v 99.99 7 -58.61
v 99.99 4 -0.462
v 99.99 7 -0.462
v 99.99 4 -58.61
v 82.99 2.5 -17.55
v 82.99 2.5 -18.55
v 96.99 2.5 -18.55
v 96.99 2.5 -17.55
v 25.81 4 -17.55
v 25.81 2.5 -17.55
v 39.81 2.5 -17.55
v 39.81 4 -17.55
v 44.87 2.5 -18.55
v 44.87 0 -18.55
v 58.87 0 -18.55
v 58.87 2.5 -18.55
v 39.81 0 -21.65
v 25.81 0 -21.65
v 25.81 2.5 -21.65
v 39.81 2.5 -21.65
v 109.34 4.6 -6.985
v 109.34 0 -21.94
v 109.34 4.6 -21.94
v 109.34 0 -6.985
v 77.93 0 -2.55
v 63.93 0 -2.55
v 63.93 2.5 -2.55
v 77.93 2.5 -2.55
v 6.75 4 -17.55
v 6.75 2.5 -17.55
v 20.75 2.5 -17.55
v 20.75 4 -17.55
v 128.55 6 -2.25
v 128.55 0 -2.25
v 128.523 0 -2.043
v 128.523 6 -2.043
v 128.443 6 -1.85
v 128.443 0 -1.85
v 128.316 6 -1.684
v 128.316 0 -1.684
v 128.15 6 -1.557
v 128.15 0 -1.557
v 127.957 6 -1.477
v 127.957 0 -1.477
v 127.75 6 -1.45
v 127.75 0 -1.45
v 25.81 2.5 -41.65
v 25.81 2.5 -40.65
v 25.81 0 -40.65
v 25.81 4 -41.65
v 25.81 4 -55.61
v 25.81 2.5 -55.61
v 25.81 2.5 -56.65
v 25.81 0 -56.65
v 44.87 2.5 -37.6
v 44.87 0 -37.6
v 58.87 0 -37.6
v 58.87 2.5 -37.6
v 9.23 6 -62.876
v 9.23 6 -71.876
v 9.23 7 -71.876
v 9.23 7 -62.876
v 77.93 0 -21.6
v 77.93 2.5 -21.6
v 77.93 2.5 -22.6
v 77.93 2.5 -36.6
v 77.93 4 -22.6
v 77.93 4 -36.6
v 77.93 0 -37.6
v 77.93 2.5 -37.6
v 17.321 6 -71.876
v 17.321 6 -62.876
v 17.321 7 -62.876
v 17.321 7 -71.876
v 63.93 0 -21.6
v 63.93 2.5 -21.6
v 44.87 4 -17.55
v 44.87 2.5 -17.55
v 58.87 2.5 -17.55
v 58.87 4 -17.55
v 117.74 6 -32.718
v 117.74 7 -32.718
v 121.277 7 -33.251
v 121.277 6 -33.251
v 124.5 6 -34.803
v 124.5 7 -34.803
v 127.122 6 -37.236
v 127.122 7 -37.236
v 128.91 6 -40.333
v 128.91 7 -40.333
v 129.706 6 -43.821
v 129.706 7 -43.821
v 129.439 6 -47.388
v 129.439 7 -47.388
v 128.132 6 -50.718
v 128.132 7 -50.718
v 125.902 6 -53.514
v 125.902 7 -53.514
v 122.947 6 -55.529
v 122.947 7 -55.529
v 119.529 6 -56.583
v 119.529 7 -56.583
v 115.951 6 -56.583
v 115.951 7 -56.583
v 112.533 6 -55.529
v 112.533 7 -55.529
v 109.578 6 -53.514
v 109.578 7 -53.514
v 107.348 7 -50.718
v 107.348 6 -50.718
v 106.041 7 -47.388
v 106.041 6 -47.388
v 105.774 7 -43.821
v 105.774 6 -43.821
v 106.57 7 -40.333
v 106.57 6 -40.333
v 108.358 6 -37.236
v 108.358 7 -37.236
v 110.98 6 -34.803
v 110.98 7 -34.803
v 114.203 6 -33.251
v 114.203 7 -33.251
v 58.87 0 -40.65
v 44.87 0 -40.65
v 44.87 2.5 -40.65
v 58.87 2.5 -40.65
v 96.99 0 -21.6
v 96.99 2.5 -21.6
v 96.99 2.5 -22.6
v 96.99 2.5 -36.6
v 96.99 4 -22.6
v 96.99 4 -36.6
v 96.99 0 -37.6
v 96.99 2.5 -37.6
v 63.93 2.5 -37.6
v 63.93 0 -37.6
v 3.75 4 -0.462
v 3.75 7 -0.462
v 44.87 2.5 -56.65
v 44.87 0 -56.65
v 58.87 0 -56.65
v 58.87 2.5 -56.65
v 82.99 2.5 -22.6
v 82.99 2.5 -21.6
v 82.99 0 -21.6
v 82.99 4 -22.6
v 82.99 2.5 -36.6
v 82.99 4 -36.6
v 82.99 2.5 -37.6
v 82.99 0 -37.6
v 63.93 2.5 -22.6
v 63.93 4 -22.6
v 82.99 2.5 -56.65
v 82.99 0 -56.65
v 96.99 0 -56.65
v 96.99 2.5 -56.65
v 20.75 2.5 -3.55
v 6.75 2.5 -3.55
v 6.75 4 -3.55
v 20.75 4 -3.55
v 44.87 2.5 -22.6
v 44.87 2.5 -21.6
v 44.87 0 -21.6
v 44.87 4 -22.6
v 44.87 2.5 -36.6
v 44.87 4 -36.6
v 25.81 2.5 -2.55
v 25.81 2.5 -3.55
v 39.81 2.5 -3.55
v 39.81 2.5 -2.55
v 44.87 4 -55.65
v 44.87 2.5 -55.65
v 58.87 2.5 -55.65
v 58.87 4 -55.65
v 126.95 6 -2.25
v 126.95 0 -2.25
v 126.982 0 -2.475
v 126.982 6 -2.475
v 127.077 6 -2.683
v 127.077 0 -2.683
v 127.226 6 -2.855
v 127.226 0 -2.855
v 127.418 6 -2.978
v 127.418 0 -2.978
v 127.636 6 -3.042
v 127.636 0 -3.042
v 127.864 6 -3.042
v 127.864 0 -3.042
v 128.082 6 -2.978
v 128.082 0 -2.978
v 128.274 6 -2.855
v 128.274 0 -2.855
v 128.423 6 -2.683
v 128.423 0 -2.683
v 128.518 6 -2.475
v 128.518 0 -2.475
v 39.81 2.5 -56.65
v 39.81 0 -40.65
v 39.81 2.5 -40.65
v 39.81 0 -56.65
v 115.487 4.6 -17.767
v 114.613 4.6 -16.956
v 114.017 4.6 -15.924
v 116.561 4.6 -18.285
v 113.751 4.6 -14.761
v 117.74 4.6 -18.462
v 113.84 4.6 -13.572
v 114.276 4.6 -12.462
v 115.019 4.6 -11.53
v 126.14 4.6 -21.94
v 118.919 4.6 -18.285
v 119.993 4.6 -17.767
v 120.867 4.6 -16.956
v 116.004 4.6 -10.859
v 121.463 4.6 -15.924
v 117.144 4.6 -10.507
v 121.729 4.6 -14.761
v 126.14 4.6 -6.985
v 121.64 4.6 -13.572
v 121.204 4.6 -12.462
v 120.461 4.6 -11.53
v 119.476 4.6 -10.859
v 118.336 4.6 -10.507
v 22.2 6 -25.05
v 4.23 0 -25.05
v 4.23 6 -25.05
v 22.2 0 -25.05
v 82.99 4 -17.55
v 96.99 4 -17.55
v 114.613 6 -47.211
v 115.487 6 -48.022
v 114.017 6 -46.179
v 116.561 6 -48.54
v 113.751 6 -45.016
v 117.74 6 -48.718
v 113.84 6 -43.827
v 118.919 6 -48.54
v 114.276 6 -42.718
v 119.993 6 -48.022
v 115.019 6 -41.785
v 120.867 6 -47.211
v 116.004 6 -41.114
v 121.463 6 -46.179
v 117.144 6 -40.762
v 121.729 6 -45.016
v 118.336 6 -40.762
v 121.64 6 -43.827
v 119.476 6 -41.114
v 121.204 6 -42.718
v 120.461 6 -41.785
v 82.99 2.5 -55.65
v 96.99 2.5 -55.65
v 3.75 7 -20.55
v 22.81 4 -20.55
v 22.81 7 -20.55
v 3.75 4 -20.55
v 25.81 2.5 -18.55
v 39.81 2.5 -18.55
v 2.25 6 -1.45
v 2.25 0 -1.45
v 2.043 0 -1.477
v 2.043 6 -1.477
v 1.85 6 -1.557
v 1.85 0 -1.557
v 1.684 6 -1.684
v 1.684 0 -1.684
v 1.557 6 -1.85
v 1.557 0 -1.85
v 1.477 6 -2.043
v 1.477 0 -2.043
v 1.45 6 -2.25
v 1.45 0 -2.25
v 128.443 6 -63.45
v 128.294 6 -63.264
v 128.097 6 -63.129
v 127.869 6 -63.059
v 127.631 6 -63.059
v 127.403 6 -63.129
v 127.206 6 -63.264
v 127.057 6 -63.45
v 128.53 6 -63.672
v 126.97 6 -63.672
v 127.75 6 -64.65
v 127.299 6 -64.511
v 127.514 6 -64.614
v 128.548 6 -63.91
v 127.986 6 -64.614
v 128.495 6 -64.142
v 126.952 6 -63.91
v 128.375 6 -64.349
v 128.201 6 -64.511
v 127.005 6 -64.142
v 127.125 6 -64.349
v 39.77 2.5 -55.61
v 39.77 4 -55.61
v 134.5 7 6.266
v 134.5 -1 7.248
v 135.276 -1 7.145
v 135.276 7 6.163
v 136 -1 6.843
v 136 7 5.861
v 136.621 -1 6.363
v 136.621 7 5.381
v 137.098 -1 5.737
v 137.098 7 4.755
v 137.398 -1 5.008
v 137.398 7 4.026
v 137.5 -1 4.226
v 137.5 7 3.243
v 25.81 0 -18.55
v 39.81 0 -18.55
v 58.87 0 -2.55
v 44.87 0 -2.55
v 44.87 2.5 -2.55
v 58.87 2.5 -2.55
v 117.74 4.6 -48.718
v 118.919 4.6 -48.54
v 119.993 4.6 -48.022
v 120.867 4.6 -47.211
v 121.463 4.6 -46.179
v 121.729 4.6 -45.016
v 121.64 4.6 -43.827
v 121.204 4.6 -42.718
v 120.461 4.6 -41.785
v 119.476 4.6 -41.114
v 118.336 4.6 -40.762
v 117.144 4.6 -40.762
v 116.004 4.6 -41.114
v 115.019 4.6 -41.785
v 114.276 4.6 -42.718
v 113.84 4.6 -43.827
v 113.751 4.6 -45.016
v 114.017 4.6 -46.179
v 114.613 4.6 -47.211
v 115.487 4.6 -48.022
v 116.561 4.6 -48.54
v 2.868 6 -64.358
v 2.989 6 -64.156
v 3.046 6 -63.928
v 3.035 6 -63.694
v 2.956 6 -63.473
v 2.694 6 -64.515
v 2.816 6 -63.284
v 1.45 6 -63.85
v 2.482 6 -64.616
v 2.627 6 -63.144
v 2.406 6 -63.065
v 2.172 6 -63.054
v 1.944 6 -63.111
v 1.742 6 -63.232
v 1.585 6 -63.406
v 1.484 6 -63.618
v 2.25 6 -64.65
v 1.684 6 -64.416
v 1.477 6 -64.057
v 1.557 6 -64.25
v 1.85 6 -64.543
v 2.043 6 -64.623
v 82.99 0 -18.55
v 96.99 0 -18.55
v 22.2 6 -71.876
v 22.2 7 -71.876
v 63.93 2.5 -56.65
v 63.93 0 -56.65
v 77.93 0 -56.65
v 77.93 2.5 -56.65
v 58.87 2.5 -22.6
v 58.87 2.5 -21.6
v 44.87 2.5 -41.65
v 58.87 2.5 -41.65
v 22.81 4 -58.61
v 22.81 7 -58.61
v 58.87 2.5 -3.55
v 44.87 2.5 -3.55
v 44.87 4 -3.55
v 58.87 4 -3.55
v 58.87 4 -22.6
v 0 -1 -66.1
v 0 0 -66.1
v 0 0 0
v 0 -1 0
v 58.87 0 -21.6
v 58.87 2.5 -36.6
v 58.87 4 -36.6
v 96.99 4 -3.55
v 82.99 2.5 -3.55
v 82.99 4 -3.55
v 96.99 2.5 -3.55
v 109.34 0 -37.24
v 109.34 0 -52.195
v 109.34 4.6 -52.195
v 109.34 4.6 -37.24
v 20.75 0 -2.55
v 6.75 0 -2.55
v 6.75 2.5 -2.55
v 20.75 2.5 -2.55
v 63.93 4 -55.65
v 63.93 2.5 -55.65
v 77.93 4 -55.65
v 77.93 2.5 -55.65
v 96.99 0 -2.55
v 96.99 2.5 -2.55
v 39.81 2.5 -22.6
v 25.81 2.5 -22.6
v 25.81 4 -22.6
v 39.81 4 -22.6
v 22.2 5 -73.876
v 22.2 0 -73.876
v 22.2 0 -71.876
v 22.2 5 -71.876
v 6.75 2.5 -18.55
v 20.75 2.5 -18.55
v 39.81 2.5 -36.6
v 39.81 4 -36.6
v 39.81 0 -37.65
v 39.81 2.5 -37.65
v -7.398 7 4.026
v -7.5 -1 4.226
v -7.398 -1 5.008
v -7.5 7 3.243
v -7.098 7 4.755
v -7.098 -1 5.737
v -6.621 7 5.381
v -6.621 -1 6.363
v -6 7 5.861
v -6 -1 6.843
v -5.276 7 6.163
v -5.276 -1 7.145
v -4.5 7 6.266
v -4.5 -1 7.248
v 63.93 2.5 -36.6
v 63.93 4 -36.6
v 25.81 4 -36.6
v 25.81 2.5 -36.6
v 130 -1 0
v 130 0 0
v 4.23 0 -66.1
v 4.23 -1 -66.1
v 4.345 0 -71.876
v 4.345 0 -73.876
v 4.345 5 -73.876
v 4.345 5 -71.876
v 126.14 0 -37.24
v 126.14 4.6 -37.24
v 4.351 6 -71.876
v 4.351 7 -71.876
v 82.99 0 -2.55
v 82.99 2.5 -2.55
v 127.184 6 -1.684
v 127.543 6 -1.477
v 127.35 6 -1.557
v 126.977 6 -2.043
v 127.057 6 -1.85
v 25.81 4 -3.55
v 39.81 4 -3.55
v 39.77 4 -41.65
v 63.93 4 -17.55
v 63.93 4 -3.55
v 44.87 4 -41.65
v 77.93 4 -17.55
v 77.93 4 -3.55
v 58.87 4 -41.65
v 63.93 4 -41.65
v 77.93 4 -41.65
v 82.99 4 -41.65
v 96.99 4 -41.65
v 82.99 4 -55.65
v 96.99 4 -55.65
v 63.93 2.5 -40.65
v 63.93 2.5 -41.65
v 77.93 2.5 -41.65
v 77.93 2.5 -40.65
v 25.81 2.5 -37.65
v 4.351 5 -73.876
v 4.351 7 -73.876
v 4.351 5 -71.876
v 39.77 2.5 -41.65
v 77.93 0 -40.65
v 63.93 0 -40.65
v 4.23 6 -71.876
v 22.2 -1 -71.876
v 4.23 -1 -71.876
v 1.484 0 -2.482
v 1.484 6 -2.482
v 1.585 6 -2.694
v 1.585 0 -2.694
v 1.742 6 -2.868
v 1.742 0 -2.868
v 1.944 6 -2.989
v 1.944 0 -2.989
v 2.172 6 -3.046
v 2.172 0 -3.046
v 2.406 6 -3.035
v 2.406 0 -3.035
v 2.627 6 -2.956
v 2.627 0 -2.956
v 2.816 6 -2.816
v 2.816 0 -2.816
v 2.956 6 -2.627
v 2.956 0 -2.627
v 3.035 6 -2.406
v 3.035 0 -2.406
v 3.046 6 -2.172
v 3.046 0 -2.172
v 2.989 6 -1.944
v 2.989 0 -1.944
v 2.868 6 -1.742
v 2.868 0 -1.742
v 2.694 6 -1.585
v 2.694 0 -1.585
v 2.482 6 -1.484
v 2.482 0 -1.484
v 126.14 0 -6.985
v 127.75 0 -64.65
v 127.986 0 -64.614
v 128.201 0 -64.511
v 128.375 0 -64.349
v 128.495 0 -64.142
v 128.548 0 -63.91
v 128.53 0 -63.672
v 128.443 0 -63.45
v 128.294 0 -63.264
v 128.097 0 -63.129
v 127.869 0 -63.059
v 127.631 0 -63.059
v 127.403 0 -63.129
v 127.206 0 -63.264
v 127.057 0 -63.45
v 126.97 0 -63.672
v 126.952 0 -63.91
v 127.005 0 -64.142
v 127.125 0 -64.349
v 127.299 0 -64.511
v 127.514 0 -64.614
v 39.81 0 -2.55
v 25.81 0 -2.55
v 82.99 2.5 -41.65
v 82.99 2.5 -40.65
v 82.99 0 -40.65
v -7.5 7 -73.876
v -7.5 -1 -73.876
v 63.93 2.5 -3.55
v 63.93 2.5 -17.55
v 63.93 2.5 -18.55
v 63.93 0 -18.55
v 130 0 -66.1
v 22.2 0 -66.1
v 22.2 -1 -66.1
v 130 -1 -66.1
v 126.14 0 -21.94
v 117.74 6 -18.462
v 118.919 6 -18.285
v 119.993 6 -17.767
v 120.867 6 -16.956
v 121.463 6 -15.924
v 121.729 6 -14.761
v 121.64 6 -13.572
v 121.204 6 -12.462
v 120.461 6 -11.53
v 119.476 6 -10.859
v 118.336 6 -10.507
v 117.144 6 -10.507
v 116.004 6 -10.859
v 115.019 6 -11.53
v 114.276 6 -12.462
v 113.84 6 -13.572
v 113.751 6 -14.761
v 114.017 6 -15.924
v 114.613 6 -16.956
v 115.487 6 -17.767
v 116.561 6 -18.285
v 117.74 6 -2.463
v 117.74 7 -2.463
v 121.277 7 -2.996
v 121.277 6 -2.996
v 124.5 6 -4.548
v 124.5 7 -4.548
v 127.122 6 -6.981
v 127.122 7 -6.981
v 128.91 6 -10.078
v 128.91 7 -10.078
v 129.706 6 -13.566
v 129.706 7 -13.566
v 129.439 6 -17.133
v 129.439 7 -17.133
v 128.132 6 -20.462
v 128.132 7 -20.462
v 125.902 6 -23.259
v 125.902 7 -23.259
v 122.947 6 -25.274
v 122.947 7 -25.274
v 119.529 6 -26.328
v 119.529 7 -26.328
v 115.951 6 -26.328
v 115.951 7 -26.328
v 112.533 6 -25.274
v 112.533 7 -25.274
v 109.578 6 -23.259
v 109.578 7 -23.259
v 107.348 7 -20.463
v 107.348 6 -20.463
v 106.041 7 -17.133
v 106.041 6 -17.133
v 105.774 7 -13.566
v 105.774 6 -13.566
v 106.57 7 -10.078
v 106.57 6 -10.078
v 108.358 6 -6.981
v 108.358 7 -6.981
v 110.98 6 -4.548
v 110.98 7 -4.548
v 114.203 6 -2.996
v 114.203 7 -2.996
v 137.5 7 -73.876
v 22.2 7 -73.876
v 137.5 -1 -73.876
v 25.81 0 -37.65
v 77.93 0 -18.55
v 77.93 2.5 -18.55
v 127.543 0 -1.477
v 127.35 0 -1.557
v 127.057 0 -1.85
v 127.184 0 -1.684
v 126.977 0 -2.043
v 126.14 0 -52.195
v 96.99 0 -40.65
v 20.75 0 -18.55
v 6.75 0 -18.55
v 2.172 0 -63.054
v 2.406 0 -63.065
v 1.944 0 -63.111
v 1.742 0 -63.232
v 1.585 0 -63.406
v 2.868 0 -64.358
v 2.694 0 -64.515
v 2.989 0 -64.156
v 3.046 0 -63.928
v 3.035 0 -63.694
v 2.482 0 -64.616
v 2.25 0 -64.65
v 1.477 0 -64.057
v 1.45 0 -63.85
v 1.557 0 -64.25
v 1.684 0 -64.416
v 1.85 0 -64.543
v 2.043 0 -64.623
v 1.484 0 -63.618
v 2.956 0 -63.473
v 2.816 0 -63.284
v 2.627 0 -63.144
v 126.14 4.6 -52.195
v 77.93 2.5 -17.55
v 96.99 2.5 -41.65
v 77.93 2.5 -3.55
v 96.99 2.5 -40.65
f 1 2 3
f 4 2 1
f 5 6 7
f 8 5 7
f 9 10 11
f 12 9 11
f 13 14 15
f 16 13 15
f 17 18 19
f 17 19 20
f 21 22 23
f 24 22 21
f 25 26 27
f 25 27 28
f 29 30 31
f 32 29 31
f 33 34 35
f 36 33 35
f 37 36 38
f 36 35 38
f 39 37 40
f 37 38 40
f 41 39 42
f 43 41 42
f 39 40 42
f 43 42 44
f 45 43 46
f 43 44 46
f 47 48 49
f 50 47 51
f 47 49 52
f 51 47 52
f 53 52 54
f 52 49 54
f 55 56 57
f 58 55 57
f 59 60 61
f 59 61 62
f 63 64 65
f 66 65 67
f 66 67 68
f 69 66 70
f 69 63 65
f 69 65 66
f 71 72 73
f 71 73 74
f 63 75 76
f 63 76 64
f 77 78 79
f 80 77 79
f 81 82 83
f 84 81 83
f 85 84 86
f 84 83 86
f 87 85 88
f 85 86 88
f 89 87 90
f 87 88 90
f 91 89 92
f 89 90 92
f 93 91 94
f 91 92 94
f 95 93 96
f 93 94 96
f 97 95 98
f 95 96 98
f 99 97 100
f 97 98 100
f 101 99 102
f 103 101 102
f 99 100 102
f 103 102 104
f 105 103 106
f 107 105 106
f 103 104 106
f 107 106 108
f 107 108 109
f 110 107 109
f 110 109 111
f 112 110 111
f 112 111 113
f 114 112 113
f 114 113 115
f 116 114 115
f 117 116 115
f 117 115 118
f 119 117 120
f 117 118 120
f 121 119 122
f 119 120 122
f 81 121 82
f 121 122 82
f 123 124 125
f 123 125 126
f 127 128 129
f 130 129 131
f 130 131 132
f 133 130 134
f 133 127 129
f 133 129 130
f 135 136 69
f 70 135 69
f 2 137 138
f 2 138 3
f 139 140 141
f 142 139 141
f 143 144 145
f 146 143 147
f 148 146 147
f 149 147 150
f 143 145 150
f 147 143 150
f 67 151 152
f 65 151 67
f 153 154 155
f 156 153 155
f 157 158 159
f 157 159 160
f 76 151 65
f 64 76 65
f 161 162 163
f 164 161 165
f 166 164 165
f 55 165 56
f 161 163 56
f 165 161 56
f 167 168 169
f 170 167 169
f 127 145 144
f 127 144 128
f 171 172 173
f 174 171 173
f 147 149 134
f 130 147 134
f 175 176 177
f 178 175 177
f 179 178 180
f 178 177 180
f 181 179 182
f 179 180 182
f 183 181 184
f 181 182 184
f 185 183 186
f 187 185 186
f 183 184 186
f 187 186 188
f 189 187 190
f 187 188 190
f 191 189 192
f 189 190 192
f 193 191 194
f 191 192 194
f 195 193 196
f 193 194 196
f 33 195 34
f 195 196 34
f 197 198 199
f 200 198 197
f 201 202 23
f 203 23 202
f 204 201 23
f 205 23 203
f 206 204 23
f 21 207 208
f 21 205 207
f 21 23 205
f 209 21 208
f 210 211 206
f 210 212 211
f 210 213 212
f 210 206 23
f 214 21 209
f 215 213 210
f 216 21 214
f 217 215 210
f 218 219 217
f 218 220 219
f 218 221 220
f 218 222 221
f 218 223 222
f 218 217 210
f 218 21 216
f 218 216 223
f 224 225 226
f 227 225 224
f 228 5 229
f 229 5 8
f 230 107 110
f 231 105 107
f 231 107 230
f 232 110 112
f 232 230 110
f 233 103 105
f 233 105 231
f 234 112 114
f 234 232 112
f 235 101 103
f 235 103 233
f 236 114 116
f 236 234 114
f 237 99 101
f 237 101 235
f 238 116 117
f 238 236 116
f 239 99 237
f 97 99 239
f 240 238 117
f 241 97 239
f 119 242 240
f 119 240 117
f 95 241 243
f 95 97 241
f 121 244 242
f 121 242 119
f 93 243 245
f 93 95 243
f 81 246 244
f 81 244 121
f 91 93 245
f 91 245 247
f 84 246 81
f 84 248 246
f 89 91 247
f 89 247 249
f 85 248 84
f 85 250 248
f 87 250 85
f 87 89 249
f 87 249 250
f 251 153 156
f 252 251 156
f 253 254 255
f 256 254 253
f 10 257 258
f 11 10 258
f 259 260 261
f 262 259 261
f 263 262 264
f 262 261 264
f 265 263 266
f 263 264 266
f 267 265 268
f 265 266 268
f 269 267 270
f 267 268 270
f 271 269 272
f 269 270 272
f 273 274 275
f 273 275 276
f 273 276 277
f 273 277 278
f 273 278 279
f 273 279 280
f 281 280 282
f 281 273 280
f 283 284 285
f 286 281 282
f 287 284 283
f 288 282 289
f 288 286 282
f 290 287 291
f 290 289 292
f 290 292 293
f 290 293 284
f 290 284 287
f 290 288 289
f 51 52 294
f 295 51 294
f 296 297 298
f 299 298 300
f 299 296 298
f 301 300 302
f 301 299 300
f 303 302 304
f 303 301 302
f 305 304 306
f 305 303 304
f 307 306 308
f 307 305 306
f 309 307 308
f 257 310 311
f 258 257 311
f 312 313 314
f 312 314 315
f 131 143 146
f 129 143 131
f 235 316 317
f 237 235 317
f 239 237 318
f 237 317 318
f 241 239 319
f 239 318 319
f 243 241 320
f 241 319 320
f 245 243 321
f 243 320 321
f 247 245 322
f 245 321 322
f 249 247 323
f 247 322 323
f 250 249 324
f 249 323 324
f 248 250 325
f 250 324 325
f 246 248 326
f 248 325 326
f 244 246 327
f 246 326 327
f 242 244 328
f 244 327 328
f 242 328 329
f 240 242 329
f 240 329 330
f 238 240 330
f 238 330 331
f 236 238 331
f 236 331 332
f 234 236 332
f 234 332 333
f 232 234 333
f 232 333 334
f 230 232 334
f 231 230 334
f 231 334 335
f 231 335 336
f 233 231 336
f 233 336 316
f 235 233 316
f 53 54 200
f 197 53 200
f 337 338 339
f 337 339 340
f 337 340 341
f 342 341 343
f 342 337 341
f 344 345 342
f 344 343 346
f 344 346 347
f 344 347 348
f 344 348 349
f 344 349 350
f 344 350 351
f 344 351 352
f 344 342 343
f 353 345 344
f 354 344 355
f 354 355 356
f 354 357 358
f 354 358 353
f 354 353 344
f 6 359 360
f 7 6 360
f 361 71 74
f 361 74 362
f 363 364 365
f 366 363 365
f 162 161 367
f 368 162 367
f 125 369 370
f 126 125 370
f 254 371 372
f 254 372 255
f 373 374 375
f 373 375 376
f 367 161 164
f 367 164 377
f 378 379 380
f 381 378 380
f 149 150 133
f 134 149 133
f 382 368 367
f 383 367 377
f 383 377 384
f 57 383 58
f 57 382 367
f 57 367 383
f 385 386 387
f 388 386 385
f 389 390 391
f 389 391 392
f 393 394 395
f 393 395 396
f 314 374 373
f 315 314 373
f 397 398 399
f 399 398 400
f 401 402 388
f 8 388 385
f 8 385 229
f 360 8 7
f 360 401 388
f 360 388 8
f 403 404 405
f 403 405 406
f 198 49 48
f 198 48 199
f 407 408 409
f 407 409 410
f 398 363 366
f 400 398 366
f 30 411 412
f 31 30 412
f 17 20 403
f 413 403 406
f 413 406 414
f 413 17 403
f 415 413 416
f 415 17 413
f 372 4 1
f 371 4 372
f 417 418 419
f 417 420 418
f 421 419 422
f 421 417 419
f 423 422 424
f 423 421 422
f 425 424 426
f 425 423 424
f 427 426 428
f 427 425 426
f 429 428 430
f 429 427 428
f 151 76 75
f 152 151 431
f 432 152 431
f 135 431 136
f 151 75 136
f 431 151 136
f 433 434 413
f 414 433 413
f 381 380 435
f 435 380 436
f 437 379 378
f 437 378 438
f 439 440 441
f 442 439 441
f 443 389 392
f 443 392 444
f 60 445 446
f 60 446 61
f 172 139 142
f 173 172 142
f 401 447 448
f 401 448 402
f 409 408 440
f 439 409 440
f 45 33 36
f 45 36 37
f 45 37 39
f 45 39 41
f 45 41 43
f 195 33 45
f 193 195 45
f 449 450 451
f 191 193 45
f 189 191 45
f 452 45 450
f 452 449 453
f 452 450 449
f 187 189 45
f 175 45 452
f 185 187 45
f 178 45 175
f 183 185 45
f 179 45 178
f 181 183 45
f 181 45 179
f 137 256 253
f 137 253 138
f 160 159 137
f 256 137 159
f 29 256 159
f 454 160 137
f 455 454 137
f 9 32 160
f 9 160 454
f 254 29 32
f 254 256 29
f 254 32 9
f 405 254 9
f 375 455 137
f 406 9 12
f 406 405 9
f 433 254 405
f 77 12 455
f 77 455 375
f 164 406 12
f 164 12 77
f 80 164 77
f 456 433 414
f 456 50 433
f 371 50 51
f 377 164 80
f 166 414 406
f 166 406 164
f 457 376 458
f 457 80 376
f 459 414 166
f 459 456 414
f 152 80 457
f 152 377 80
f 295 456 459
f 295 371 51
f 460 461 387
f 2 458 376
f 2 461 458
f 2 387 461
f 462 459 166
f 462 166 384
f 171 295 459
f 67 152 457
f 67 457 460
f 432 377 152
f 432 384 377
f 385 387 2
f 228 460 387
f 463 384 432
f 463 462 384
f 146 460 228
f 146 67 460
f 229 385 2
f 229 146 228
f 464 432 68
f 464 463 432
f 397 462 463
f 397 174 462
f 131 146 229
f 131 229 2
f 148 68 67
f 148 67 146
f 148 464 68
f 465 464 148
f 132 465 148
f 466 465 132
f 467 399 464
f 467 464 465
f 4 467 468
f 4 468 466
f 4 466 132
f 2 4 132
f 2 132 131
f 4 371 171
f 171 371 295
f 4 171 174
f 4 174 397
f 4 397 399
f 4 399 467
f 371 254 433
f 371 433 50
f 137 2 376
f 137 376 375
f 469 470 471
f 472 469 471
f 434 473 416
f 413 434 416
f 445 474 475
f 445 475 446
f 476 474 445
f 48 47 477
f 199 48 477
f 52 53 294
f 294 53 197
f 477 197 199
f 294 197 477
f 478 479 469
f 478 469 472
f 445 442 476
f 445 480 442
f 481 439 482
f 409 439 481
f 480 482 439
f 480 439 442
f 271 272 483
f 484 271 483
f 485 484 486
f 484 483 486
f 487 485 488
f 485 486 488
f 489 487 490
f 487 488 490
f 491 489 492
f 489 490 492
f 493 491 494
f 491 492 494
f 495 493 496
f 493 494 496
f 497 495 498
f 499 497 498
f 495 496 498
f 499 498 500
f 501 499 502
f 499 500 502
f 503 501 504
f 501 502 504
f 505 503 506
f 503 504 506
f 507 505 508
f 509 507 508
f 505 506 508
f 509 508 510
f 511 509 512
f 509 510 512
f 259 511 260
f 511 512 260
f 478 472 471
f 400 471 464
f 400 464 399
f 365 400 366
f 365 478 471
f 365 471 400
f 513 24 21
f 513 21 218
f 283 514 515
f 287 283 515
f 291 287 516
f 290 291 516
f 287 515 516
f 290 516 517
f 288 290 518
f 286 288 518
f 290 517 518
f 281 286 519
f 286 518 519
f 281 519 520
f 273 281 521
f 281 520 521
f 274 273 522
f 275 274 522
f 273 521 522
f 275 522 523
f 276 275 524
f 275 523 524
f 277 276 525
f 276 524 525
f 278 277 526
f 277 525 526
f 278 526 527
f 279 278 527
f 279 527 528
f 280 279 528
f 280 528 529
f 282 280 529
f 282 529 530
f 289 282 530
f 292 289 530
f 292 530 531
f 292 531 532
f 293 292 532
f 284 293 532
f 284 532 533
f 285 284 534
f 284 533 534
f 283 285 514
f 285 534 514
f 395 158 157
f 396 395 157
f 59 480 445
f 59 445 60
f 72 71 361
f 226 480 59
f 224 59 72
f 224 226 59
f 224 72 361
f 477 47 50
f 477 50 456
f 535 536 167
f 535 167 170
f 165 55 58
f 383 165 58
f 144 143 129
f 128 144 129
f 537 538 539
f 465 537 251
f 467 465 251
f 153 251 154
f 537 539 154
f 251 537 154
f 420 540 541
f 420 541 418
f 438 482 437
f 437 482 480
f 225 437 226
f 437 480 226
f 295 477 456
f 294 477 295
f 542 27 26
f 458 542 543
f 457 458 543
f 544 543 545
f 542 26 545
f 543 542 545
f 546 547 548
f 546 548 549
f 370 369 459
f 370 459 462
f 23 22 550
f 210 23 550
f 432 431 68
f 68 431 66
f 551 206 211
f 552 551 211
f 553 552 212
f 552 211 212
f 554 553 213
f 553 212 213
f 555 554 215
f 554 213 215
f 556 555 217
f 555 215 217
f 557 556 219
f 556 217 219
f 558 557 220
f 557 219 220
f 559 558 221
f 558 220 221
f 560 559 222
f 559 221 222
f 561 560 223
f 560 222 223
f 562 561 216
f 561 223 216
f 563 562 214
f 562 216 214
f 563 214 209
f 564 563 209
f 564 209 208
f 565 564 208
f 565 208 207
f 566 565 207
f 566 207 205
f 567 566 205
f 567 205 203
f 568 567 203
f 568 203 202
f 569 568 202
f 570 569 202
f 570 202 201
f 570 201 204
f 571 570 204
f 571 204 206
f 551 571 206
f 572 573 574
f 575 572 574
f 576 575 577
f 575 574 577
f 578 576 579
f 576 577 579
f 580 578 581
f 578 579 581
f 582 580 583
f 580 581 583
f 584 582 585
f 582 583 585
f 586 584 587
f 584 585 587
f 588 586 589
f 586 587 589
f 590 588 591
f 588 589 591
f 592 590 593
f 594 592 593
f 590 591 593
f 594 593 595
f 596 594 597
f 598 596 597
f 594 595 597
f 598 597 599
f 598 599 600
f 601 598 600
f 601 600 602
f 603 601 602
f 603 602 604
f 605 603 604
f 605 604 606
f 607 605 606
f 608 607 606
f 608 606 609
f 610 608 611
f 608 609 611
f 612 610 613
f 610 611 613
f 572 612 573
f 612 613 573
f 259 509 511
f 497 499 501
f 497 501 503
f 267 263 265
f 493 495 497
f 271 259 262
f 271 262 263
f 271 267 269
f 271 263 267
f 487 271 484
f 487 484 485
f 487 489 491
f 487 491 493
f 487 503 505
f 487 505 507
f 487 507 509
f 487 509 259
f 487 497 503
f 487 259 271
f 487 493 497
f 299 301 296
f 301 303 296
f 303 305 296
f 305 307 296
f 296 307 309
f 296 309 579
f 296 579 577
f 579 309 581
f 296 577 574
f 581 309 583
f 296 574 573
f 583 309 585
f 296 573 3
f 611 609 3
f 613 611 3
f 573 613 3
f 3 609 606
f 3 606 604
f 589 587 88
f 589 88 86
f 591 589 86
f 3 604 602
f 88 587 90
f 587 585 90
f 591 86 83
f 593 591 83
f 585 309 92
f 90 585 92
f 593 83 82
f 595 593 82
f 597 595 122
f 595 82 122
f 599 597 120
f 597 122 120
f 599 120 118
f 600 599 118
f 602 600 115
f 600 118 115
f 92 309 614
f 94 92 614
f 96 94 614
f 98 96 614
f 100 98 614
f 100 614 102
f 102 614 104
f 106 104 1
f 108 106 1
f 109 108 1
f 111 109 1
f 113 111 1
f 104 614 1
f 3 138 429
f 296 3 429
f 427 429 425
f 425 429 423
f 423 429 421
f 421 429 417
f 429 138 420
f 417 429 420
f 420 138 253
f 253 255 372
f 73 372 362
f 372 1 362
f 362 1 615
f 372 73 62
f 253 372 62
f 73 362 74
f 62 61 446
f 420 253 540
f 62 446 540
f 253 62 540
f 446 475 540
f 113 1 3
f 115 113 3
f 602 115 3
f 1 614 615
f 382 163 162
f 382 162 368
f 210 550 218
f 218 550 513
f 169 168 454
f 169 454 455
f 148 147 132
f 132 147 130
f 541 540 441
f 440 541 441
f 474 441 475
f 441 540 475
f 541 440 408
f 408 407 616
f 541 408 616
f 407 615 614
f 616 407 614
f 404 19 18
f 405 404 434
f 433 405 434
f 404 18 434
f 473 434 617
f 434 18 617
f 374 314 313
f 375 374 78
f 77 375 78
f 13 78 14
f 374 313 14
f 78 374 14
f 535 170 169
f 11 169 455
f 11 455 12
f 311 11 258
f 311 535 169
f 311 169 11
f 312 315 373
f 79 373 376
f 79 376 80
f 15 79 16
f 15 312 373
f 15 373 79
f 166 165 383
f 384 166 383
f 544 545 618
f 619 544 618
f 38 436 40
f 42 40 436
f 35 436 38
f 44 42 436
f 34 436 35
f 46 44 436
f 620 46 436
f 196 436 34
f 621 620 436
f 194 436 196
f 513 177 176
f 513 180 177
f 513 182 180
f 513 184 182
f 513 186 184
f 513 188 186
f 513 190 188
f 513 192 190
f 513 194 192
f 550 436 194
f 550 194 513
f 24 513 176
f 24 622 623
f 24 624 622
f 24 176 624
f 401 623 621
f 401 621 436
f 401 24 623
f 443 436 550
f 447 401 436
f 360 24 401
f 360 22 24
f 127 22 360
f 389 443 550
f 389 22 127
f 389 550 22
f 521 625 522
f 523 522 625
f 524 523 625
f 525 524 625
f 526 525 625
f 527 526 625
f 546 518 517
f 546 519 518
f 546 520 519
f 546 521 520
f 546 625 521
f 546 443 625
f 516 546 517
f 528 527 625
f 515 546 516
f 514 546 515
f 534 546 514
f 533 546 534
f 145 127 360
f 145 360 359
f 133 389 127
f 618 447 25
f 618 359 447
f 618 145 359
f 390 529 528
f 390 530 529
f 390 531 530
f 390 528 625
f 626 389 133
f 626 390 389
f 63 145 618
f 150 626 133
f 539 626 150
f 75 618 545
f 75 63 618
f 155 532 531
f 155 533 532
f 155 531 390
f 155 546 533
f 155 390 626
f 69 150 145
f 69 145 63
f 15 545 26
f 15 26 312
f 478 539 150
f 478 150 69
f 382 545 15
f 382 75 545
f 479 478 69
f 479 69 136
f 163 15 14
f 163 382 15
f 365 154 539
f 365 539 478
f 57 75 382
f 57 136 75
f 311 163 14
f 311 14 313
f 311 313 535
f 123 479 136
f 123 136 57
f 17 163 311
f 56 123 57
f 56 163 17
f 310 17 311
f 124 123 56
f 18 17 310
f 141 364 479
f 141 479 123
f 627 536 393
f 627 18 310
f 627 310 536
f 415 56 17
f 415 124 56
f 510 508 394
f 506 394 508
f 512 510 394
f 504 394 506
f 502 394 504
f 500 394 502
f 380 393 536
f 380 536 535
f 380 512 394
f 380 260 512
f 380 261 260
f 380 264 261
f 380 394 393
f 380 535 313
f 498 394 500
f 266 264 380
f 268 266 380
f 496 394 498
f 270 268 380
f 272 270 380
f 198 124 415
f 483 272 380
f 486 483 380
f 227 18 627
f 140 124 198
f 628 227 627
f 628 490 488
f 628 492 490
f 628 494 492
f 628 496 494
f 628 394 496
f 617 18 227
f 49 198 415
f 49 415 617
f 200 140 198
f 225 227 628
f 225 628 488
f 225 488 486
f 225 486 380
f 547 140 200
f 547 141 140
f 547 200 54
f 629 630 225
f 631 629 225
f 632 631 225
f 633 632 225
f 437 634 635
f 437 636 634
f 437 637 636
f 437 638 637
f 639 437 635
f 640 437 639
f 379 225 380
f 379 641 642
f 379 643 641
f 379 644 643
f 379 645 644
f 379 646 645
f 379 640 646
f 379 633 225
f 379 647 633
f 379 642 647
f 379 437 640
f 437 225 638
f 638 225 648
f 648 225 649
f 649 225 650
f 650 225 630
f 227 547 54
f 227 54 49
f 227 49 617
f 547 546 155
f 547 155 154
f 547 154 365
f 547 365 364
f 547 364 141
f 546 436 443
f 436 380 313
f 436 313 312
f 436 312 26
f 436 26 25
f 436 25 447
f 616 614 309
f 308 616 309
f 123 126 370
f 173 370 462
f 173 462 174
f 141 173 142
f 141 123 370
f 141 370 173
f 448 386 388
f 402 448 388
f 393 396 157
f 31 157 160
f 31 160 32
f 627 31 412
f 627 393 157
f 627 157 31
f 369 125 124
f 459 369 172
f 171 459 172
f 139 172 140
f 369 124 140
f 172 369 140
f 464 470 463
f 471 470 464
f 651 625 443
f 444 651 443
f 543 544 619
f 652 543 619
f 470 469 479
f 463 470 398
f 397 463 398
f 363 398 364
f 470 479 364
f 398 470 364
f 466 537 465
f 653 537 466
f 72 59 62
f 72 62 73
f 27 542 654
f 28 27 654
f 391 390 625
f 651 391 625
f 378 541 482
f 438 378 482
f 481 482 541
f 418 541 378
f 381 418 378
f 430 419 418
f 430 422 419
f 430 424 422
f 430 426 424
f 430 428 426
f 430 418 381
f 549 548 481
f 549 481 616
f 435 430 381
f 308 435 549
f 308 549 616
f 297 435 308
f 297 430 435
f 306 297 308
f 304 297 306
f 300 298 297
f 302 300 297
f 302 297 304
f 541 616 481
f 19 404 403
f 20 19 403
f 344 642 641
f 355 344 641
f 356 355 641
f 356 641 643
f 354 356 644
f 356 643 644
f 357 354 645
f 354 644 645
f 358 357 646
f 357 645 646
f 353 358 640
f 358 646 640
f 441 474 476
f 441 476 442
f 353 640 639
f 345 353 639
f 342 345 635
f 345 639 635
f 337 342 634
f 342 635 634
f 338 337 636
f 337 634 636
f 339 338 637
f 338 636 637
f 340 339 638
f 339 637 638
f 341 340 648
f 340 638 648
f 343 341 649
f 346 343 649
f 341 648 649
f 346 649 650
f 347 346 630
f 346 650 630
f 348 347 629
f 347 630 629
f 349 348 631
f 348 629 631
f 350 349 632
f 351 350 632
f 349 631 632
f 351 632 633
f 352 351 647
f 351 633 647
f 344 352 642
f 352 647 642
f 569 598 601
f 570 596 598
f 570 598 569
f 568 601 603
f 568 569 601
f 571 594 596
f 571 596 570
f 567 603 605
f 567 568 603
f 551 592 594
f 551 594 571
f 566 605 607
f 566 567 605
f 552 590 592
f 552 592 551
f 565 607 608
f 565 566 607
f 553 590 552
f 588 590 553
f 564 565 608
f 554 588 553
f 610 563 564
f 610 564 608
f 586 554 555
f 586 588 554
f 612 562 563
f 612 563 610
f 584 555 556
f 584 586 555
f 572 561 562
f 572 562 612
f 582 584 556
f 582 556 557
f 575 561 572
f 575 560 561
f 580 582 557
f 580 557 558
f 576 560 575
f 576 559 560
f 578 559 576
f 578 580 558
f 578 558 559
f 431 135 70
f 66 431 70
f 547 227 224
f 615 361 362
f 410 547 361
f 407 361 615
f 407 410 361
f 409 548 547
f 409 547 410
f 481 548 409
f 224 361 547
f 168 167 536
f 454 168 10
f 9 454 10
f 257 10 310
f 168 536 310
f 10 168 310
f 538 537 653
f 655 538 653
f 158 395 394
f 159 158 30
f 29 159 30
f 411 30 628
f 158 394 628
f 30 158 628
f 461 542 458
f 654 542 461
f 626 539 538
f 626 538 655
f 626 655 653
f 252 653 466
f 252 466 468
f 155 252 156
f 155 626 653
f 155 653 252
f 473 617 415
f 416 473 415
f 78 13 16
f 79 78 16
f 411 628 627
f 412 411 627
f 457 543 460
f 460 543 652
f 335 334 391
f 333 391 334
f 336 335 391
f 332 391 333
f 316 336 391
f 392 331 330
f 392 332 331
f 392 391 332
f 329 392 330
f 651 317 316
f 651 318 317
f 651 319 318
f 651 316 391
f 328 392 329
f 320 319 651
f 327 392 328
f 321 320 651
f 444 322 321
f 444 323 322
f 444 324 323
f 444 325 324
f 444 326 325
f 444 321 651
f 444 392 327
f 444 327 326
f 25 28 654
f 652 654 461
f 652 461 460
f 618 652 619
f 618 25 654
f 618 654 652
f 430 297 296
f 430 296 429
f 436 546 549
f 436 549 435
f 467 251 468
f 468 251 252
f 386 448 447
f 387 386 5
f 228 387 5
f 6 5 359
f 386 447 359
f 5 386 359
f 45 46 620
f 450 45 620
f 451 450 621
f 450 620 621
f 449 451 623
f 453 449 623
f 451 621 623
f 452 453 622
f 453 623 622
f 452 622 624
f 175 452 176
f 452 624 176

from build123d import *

# Parameters (mm, degrees)
SKETCH1_W           = 14
SKETCH1_H           = 14
SKETCH1_W_2         = 13.96
SKETCH1_H_2         = 13.96
SKETCH1_W_3         = 17.83
SKETCH1_H_3         = 34.365
SKETCH1_W_4         = 16.8
SKETCH1_H_4         = 14.955
BOSS_EXTRUDE2_DEPTH = 4
SKETCH3_W           = 14
SKETCH3_H           = 16
CUT_EXTRUDE1_DEPTH  = 2.5
SKETCH6_W           = 145
SKETCH6_H           = 81.124541
BOSS_EXTRUDE3_DEPTH = 7
SKETCH12_R          = 0.8
CUT_EXTRUDE5_DEPTH  = 6
SKETCH13_W          = 17.97
SKETCH13_H          = 46.826347
CUT_EXTRUDE6_DEPTH  = 6
SKETCH14_W          = 16.8
SKETCH14_H          = 14.955
CUT_EXTRUDE8_DEPTH  = 4.6
SKETCH15_R          = 4
CUT_EXTRUDE9_DEPTH  = 10
SKETCH16_R          = 12
CUT_EXTRUDE10_DEPTH = 1
SKETCH20_W          = 145
SKETCH20_H          = 81.124541
SKETCH20_W_2        = 130
SKETCH20_H_2        = 66.1
BOSS_EXTRUDE5_DEPTH = 1
SKETCH21_W          = 145
SKETCH21_H          = 34.866824831
CUT_EXTRUDE11_DEPTH = 18
FILLET1_R           = 3
SKETCH27_W          = 17.97
SKETCH27_H          = 5.776347
CUT_EXTRUDE13_DEPTH = 2
CUT_EXTRUDE14_START = -2
CUT_EXTRUDE14_DEPTH = 2
SKETCH28_W          = 17.854591413
SKETCH28_H          = 5
CUT_EXTRUDE15_DEPTH = 2


# Read off the part's stored shape, not the designer's step: Cut-Extrude14
with BuildPart() as part:
    # Sketch1 → Boss-Extrude2 (new body)
    with BuildSketch(Plane(origin=(0, 0, 0), x_dir=(1, 0, 0), z_dir=(0, 1, 0))):
        Polygon((0, 0), (109.34, 0), (130, 0), (130, 66.1), (0, 66.1), align=None)
        with Locations((51.87, 10.55)):
            Rectangle(SKETCH1_W, SKETCH1_H, mode=Mode.SUBTRACT)
        with Locations((32.81, 10.55)):
            Rectangle(SKETCH1_W, SKETCH1_H, mode=Mode.SUBTRACT)
        with Locations((32.81, 29.6)):
            Rectangle(SKETCH1_W, SKETCH1_H, mode=Mode.SUBTRACT)
        with Locations((32.79, 48.63)):
            Rectangle(SKETCH1_W_2, SKETCH1_H_2, mode=Mode.SUBTRACT)
        with Locations((13.145, 42.2325)):
            Rectangle(SKETCH1_W_3, SKETCH1_H_3, mode=Mode.SUBTRACT)
        with Locations((13.75, 10.55)):
            Rectangle(SKETCH1_W, SKETCH1_H, mode=Mode.SUBTRACT)
        with Locations((51.87, 29.6)):
            Rectangle(SKETCH1_W, SKETCH1_H, mode=Mode.SUBTRACT)
        with Locations((70.93, 10.55)):
            Rectangle(SKETCH1_W, SKETCH1_H, mode=Mode.SUBTRACT)
        with Locations((89.99, 10.55)):
            Rectangle(SKETCH1_W, SKETCH1_H, mode=Mode.SUBTRACT)
        with Locations((117.74, 14.4625)):
            Rectangle(SKETCH1_W_4, SKETCH1_H_4, mode=Mode.SUBTRACT)
        with Locations((70.93, 29.6)):
            Rectangle(SKETCH1_W, SKETCH1_H, mode=Mode.SUBTRACT)
        with Locations((89.99, 29.6)):
            Rectangle(SKETCH1_W, SKETCH1_H, mode=Mode.SUBTRACT)
        with Locations((51.87, 48.65)):
            Rectangle(SKETCH1_W, SKETCH1_H, mode=Mode.SUBTRACT)
        with Locations((70.93, 48.65)):
            Rectangle(SKETCH1_W, SKETCH1_H, mode=Mode.SUBTRACT)
        with Locations((89.99, 48.65)):
            Rectangle(SKETCH1_W, SKETCH1_H, mode=Mode.SUBTRACT)
        with Locations((117.74, 44.7175)):
            Rectangle(SKETCH1_W_4, SKETCH1_H_4, mode=Mode.SUBTRACT)
    extrude(amount=BOSS_EXTRUDE2_DEPTH)

    # Sketch3 → Cut-Extrude1 (cut)
    with BuildSketch(Plane(origin=(0, 0, 0), x_dir=(1, 0, 0), z_dir=(0, 1, 0))):
        with Locations((89.99, 29.6)):
            Rectangle(SKETCH3_W, SKETCH3_H)
        with Locations((70.93, 29.6)):
            Rectangle(SKETCH3_W, SKETCH3_H)
        with Locations((89.99, 48.65)):
            Rectangle(SKETCH3_W, SKETCH3_H)
        with Locations((70.93, 48.65)):
            Rectangle(SKETCH3_W, SKETCH3_H)
        with Locations((51.87, 48.65)):
            Rectangle(SKETCH3_W, SKETCH3_H)
        with Locations((32.81, 48.65)):
            Rectangle(SKETCH3_W, SKETCH3_H)
        with Locations((32.81, 29.650197757)):
            Rectangle(SKETCH3_W, SKETCH3_H)
        with Locations((51.87, 29.6)):
            Rectangle(SKETCH3_W, SKETCH3_H)
        with Locations((13.75, 10.55)):
            Rectangle(SKETCH3_W, SKETCH3_H)
        with Locations((32.81, 10.55)):
            Rectangle(SKETCH3_W, SKETCH3_H)
        with Locations((51.87, 10.55)):
            Rectangle(SKETCH3_W, SKETCH3_H)
        with Locations((70.93, 10.55)):
            Rectangle(SKETCH3_W, SKETCH3_H)
        with Locations((89.99, 10.55)):
            Rectangle(SKETCH3_W, SKETCH3_H)
    extrude(amount=CUT_EXTRUDE1_DEPTH, mode=Mode.SUBTRACT)

    # Sketch6 → Boss-Extrude3 (add)
    with BuildSketch(Plane(origin=(0, 0, 0), x_dir=(-1, 0, 0), z_dir=(0, -1, 0))):
        with Locations((-65, 33.3140765)):
            Rectangle(SKETCH6_W, SKETCH6_H)
        Polygon((-99.99, 58.61), (-39.77, 58.61), (-22.81, 58.61), (-22.81, 53.222321133), (-22.81, 20.55), (-3.75, 20.55), (-3.75, 12.496372948), (-3.75, 0.461789698), (-20.75, 0.461789698), (-99.99, 0.461789698), align=None, mode=Mode.SUBTRACT)
    extrude(amount=-BOSS_EXTRUDE3_DEPTH)

    # Sketch12 → Cut-Extrude5 (cut)
    with BuildSketch(Plane(origin=(0, 0, 0), x_dir=(-1, 0, 0), z_dir=(0, -1, 0))):
        with BuildLine():
            ThreePointArc((-1.45, 63.85), (-1.684314575, 64.415685425), (-2.25, 64.65))
            Line((-2.25, 64.65), (-2.25, 63.85))
            Line((-2.25, 63.85), (-1.45, 63.85))
        make_face()
        with BuildLine():
            Line((-2.25, 63.85), (-2.25, 64.65))
            ThreePointArc((-2.25, 64.65), (-2.815685425, 63.284314575), (-1.45, 63.85))
            Line((-1.45, 63.85), (-2.25, 63.85))
        make_face()
        with BuildLine():
            ThreePointArc((-1.45, 2.25), (-2.815685425, 2.815685425), (-2.25, 1.45))
            Line((-2.25, 1.45), (-2.25, 2.25))
            Line((-2.25, 2.25), (-1.45, 2.25))
        make_face()
        with BuildLine():
            Line((-2.25, 2.25), (-2.25, 1.45))
            ThreePointArc((-2.25, 1.45), (-1.684314575, 1.684314575), (-1.45, 2.25))
            Line((-1.45, 2.25), (-2.25, 2.25))
        make_face()
        with BuildLine():
            ThreePointArc((-128.55, 2.25), (-128.315685425, 1.684314575), (-127.75, 1.45))
            Line((-127.75, 1.45), (-127.75, 2.25))
            Line((-127.75, 2.25), (-128.55, 2.25))
        make_face()
        with BuildLine():
            Line((-127.75, 2.25), (-127.75, 1.45))
            ThreePointArc((-127.75, 1.45), (-127.184314575, 1.684314575), (-126.95, 2.25))
            ThreePointArc((-126.95, 2.25), (-127.75, 3.05), (-128.55, 2.25))
            Line((-128.55, 2.25), (-127.75, 2.25))
        make_face()
        with Locations(Location((-127.75, 63.85, 0), (0, 0, 90))):
            Circle(SKETCH12_R)
    extrude(amount=-CUT_EXTRUDE5_DEPTH, mode=Mode.SUBTRACT)

    # Sketch13 → Cut-Extrude6 (cut)
    with BuildSketch(Plane.XZ):
        with Locations((13.215, -48.4631735)):
            Rectangle(SKETCH13_W, SKETCH13_H)
    extrude(amount=-CUT_EXTRUDE6_DEPTH, mode=Mode.SUBTRACT)

    # Sketch14 → Cut-Extrude8 (cut)
    with BuildSketch(Plane.XZ):
        with Locations((117.74, -14.4625)):
            Rectangle(SKETCH14_W, SKETCH14_H)
        with Locations((117.74, -44.7175)):
            Rectangle(SKETCH14_W, SKETCH14_H)
    extrude(amount=-CUT_EXTRUDE8_DEPTH, mode=Mode.SUBTRACT)

    # Sketch15 → Cut-Extrude9 (cut)
    with BuildSketch(Plane.XZ):
        with Locations(Location((117.74, -44.7175, 0), (0, 0, 270))):
            Circle(SKETCH15_R)
        with Locations(Location((117.74, -14.4625, 0), (0, 0, 270))):
            Circle(SKETCH15_R)
    extrude(amount=-CUT_EXTRUDE9_DEPTH, mode=Mode.SUBTRACT)

    # Sketch16 → Cut-Extrude10 (cut)
    with BuildSketch(Plane(origin=(0, 7, 0), x_dir=(1, 0, 0), z_dir=(0, 1, 0))):
        with Locations(Location((117.74, 44.7175, 0), (0, 0, 270))):
            Circle(SKETCH16_R)
        with Locations(Location((117.74, 14.4625, 0), (0, 0, 270))):
            Circle(SKETCH16_R)
    extrude(amount=-CUT_EXTRUDE10_DEPTH, mode=Mode.SUBTRACT)

    # Sketch20 → Boss-Extrude5 (add)
    with BuildSketch(Plane.XZ):
        with Locations((65, -33.3140765)):
            Rectangle(SKETCH20_W, SKETCH20_H)
        with Locations((65, -33.05)):
            Rectangle(SKETCH20_W_2, SKETCH20_H_2, mode=Mode.SUBTRACT)
    extrude(amount=BOSS_EXTRUDE5_DEPTH)

    # Sketch21 → Cut-Extrude11 (cut)
    with BuildSketch(Plane(origin=(0, -1.861896279, 0.228612117), x_dir=(-1, 0, 0), z_dir=(0, 0.9925461516413211, -0.1218693434051548))):
        with Locations((-65, 24.505710134)):
            Rectangle(SKETCH21_W, SKETCH21_H)
    extrude(amount=CUT_EXTRUDE11_DEPTH, mode=Mode.SUBTRACT)

    # Fillet1
    fillet1_edges = [part.edges().sort_by_distance(p)[0] for p in [
        (-7.5, 3, 6.757055756),
        (137.5, 3, 6.757055756),
    ]]
    fillet(fillet1_edges, radius=FILLET1_R)

    # Sketch27 → Cut-Extrude13 (cut)
    with BuildSketch(Plane.XZ):
        with Locations((13.215, -68.9881735)):
            Rectangle(SKETCH27_W, SKETCH27_H)
    extrude(amount=CUT_EXTRUDE13_DEPTH, mode=Mode.SUBTRACT)

    # Cut-Extrude14 outline → Cut-Extrude14 (cut)
    with BuildSketch(Plane(origin=(0, 7, 0), x_dir=(1, 0, 0), z_dir=(0, 1, 0)).offset(CUT_EXTRUDE14_START)):
        Polygon((4.351462148, 71.876347), (9.23, 71.876347), (9.23, 62.876347), (17.321462297, 62.876347), (17.321462297, 71.876347), (22.2, 71.876347), (22.2, 73.876347), (4.351462148, 73.876347), align=None)
    extrude(amount=CUT_EXTRUDE14_DEPTH, mode=Mode.SUBTRACT)

    # Sketch28 → Cut-Extrude15 (cut)
    with BuildSketch(Plane(origin=(0, 0, -73.876347), x_dir=(-1, 0, 0), z_dir=(0, 0, -1))):
        with Locations((-13.272704442, 2.5)):
            Rectangle(SKETCH28_W, SKETCH28_H)
    extrude(amount=-CUT_EXTRUDE15_DEPTH, mode=Mode.SUBTRACT)


solid = part.part
